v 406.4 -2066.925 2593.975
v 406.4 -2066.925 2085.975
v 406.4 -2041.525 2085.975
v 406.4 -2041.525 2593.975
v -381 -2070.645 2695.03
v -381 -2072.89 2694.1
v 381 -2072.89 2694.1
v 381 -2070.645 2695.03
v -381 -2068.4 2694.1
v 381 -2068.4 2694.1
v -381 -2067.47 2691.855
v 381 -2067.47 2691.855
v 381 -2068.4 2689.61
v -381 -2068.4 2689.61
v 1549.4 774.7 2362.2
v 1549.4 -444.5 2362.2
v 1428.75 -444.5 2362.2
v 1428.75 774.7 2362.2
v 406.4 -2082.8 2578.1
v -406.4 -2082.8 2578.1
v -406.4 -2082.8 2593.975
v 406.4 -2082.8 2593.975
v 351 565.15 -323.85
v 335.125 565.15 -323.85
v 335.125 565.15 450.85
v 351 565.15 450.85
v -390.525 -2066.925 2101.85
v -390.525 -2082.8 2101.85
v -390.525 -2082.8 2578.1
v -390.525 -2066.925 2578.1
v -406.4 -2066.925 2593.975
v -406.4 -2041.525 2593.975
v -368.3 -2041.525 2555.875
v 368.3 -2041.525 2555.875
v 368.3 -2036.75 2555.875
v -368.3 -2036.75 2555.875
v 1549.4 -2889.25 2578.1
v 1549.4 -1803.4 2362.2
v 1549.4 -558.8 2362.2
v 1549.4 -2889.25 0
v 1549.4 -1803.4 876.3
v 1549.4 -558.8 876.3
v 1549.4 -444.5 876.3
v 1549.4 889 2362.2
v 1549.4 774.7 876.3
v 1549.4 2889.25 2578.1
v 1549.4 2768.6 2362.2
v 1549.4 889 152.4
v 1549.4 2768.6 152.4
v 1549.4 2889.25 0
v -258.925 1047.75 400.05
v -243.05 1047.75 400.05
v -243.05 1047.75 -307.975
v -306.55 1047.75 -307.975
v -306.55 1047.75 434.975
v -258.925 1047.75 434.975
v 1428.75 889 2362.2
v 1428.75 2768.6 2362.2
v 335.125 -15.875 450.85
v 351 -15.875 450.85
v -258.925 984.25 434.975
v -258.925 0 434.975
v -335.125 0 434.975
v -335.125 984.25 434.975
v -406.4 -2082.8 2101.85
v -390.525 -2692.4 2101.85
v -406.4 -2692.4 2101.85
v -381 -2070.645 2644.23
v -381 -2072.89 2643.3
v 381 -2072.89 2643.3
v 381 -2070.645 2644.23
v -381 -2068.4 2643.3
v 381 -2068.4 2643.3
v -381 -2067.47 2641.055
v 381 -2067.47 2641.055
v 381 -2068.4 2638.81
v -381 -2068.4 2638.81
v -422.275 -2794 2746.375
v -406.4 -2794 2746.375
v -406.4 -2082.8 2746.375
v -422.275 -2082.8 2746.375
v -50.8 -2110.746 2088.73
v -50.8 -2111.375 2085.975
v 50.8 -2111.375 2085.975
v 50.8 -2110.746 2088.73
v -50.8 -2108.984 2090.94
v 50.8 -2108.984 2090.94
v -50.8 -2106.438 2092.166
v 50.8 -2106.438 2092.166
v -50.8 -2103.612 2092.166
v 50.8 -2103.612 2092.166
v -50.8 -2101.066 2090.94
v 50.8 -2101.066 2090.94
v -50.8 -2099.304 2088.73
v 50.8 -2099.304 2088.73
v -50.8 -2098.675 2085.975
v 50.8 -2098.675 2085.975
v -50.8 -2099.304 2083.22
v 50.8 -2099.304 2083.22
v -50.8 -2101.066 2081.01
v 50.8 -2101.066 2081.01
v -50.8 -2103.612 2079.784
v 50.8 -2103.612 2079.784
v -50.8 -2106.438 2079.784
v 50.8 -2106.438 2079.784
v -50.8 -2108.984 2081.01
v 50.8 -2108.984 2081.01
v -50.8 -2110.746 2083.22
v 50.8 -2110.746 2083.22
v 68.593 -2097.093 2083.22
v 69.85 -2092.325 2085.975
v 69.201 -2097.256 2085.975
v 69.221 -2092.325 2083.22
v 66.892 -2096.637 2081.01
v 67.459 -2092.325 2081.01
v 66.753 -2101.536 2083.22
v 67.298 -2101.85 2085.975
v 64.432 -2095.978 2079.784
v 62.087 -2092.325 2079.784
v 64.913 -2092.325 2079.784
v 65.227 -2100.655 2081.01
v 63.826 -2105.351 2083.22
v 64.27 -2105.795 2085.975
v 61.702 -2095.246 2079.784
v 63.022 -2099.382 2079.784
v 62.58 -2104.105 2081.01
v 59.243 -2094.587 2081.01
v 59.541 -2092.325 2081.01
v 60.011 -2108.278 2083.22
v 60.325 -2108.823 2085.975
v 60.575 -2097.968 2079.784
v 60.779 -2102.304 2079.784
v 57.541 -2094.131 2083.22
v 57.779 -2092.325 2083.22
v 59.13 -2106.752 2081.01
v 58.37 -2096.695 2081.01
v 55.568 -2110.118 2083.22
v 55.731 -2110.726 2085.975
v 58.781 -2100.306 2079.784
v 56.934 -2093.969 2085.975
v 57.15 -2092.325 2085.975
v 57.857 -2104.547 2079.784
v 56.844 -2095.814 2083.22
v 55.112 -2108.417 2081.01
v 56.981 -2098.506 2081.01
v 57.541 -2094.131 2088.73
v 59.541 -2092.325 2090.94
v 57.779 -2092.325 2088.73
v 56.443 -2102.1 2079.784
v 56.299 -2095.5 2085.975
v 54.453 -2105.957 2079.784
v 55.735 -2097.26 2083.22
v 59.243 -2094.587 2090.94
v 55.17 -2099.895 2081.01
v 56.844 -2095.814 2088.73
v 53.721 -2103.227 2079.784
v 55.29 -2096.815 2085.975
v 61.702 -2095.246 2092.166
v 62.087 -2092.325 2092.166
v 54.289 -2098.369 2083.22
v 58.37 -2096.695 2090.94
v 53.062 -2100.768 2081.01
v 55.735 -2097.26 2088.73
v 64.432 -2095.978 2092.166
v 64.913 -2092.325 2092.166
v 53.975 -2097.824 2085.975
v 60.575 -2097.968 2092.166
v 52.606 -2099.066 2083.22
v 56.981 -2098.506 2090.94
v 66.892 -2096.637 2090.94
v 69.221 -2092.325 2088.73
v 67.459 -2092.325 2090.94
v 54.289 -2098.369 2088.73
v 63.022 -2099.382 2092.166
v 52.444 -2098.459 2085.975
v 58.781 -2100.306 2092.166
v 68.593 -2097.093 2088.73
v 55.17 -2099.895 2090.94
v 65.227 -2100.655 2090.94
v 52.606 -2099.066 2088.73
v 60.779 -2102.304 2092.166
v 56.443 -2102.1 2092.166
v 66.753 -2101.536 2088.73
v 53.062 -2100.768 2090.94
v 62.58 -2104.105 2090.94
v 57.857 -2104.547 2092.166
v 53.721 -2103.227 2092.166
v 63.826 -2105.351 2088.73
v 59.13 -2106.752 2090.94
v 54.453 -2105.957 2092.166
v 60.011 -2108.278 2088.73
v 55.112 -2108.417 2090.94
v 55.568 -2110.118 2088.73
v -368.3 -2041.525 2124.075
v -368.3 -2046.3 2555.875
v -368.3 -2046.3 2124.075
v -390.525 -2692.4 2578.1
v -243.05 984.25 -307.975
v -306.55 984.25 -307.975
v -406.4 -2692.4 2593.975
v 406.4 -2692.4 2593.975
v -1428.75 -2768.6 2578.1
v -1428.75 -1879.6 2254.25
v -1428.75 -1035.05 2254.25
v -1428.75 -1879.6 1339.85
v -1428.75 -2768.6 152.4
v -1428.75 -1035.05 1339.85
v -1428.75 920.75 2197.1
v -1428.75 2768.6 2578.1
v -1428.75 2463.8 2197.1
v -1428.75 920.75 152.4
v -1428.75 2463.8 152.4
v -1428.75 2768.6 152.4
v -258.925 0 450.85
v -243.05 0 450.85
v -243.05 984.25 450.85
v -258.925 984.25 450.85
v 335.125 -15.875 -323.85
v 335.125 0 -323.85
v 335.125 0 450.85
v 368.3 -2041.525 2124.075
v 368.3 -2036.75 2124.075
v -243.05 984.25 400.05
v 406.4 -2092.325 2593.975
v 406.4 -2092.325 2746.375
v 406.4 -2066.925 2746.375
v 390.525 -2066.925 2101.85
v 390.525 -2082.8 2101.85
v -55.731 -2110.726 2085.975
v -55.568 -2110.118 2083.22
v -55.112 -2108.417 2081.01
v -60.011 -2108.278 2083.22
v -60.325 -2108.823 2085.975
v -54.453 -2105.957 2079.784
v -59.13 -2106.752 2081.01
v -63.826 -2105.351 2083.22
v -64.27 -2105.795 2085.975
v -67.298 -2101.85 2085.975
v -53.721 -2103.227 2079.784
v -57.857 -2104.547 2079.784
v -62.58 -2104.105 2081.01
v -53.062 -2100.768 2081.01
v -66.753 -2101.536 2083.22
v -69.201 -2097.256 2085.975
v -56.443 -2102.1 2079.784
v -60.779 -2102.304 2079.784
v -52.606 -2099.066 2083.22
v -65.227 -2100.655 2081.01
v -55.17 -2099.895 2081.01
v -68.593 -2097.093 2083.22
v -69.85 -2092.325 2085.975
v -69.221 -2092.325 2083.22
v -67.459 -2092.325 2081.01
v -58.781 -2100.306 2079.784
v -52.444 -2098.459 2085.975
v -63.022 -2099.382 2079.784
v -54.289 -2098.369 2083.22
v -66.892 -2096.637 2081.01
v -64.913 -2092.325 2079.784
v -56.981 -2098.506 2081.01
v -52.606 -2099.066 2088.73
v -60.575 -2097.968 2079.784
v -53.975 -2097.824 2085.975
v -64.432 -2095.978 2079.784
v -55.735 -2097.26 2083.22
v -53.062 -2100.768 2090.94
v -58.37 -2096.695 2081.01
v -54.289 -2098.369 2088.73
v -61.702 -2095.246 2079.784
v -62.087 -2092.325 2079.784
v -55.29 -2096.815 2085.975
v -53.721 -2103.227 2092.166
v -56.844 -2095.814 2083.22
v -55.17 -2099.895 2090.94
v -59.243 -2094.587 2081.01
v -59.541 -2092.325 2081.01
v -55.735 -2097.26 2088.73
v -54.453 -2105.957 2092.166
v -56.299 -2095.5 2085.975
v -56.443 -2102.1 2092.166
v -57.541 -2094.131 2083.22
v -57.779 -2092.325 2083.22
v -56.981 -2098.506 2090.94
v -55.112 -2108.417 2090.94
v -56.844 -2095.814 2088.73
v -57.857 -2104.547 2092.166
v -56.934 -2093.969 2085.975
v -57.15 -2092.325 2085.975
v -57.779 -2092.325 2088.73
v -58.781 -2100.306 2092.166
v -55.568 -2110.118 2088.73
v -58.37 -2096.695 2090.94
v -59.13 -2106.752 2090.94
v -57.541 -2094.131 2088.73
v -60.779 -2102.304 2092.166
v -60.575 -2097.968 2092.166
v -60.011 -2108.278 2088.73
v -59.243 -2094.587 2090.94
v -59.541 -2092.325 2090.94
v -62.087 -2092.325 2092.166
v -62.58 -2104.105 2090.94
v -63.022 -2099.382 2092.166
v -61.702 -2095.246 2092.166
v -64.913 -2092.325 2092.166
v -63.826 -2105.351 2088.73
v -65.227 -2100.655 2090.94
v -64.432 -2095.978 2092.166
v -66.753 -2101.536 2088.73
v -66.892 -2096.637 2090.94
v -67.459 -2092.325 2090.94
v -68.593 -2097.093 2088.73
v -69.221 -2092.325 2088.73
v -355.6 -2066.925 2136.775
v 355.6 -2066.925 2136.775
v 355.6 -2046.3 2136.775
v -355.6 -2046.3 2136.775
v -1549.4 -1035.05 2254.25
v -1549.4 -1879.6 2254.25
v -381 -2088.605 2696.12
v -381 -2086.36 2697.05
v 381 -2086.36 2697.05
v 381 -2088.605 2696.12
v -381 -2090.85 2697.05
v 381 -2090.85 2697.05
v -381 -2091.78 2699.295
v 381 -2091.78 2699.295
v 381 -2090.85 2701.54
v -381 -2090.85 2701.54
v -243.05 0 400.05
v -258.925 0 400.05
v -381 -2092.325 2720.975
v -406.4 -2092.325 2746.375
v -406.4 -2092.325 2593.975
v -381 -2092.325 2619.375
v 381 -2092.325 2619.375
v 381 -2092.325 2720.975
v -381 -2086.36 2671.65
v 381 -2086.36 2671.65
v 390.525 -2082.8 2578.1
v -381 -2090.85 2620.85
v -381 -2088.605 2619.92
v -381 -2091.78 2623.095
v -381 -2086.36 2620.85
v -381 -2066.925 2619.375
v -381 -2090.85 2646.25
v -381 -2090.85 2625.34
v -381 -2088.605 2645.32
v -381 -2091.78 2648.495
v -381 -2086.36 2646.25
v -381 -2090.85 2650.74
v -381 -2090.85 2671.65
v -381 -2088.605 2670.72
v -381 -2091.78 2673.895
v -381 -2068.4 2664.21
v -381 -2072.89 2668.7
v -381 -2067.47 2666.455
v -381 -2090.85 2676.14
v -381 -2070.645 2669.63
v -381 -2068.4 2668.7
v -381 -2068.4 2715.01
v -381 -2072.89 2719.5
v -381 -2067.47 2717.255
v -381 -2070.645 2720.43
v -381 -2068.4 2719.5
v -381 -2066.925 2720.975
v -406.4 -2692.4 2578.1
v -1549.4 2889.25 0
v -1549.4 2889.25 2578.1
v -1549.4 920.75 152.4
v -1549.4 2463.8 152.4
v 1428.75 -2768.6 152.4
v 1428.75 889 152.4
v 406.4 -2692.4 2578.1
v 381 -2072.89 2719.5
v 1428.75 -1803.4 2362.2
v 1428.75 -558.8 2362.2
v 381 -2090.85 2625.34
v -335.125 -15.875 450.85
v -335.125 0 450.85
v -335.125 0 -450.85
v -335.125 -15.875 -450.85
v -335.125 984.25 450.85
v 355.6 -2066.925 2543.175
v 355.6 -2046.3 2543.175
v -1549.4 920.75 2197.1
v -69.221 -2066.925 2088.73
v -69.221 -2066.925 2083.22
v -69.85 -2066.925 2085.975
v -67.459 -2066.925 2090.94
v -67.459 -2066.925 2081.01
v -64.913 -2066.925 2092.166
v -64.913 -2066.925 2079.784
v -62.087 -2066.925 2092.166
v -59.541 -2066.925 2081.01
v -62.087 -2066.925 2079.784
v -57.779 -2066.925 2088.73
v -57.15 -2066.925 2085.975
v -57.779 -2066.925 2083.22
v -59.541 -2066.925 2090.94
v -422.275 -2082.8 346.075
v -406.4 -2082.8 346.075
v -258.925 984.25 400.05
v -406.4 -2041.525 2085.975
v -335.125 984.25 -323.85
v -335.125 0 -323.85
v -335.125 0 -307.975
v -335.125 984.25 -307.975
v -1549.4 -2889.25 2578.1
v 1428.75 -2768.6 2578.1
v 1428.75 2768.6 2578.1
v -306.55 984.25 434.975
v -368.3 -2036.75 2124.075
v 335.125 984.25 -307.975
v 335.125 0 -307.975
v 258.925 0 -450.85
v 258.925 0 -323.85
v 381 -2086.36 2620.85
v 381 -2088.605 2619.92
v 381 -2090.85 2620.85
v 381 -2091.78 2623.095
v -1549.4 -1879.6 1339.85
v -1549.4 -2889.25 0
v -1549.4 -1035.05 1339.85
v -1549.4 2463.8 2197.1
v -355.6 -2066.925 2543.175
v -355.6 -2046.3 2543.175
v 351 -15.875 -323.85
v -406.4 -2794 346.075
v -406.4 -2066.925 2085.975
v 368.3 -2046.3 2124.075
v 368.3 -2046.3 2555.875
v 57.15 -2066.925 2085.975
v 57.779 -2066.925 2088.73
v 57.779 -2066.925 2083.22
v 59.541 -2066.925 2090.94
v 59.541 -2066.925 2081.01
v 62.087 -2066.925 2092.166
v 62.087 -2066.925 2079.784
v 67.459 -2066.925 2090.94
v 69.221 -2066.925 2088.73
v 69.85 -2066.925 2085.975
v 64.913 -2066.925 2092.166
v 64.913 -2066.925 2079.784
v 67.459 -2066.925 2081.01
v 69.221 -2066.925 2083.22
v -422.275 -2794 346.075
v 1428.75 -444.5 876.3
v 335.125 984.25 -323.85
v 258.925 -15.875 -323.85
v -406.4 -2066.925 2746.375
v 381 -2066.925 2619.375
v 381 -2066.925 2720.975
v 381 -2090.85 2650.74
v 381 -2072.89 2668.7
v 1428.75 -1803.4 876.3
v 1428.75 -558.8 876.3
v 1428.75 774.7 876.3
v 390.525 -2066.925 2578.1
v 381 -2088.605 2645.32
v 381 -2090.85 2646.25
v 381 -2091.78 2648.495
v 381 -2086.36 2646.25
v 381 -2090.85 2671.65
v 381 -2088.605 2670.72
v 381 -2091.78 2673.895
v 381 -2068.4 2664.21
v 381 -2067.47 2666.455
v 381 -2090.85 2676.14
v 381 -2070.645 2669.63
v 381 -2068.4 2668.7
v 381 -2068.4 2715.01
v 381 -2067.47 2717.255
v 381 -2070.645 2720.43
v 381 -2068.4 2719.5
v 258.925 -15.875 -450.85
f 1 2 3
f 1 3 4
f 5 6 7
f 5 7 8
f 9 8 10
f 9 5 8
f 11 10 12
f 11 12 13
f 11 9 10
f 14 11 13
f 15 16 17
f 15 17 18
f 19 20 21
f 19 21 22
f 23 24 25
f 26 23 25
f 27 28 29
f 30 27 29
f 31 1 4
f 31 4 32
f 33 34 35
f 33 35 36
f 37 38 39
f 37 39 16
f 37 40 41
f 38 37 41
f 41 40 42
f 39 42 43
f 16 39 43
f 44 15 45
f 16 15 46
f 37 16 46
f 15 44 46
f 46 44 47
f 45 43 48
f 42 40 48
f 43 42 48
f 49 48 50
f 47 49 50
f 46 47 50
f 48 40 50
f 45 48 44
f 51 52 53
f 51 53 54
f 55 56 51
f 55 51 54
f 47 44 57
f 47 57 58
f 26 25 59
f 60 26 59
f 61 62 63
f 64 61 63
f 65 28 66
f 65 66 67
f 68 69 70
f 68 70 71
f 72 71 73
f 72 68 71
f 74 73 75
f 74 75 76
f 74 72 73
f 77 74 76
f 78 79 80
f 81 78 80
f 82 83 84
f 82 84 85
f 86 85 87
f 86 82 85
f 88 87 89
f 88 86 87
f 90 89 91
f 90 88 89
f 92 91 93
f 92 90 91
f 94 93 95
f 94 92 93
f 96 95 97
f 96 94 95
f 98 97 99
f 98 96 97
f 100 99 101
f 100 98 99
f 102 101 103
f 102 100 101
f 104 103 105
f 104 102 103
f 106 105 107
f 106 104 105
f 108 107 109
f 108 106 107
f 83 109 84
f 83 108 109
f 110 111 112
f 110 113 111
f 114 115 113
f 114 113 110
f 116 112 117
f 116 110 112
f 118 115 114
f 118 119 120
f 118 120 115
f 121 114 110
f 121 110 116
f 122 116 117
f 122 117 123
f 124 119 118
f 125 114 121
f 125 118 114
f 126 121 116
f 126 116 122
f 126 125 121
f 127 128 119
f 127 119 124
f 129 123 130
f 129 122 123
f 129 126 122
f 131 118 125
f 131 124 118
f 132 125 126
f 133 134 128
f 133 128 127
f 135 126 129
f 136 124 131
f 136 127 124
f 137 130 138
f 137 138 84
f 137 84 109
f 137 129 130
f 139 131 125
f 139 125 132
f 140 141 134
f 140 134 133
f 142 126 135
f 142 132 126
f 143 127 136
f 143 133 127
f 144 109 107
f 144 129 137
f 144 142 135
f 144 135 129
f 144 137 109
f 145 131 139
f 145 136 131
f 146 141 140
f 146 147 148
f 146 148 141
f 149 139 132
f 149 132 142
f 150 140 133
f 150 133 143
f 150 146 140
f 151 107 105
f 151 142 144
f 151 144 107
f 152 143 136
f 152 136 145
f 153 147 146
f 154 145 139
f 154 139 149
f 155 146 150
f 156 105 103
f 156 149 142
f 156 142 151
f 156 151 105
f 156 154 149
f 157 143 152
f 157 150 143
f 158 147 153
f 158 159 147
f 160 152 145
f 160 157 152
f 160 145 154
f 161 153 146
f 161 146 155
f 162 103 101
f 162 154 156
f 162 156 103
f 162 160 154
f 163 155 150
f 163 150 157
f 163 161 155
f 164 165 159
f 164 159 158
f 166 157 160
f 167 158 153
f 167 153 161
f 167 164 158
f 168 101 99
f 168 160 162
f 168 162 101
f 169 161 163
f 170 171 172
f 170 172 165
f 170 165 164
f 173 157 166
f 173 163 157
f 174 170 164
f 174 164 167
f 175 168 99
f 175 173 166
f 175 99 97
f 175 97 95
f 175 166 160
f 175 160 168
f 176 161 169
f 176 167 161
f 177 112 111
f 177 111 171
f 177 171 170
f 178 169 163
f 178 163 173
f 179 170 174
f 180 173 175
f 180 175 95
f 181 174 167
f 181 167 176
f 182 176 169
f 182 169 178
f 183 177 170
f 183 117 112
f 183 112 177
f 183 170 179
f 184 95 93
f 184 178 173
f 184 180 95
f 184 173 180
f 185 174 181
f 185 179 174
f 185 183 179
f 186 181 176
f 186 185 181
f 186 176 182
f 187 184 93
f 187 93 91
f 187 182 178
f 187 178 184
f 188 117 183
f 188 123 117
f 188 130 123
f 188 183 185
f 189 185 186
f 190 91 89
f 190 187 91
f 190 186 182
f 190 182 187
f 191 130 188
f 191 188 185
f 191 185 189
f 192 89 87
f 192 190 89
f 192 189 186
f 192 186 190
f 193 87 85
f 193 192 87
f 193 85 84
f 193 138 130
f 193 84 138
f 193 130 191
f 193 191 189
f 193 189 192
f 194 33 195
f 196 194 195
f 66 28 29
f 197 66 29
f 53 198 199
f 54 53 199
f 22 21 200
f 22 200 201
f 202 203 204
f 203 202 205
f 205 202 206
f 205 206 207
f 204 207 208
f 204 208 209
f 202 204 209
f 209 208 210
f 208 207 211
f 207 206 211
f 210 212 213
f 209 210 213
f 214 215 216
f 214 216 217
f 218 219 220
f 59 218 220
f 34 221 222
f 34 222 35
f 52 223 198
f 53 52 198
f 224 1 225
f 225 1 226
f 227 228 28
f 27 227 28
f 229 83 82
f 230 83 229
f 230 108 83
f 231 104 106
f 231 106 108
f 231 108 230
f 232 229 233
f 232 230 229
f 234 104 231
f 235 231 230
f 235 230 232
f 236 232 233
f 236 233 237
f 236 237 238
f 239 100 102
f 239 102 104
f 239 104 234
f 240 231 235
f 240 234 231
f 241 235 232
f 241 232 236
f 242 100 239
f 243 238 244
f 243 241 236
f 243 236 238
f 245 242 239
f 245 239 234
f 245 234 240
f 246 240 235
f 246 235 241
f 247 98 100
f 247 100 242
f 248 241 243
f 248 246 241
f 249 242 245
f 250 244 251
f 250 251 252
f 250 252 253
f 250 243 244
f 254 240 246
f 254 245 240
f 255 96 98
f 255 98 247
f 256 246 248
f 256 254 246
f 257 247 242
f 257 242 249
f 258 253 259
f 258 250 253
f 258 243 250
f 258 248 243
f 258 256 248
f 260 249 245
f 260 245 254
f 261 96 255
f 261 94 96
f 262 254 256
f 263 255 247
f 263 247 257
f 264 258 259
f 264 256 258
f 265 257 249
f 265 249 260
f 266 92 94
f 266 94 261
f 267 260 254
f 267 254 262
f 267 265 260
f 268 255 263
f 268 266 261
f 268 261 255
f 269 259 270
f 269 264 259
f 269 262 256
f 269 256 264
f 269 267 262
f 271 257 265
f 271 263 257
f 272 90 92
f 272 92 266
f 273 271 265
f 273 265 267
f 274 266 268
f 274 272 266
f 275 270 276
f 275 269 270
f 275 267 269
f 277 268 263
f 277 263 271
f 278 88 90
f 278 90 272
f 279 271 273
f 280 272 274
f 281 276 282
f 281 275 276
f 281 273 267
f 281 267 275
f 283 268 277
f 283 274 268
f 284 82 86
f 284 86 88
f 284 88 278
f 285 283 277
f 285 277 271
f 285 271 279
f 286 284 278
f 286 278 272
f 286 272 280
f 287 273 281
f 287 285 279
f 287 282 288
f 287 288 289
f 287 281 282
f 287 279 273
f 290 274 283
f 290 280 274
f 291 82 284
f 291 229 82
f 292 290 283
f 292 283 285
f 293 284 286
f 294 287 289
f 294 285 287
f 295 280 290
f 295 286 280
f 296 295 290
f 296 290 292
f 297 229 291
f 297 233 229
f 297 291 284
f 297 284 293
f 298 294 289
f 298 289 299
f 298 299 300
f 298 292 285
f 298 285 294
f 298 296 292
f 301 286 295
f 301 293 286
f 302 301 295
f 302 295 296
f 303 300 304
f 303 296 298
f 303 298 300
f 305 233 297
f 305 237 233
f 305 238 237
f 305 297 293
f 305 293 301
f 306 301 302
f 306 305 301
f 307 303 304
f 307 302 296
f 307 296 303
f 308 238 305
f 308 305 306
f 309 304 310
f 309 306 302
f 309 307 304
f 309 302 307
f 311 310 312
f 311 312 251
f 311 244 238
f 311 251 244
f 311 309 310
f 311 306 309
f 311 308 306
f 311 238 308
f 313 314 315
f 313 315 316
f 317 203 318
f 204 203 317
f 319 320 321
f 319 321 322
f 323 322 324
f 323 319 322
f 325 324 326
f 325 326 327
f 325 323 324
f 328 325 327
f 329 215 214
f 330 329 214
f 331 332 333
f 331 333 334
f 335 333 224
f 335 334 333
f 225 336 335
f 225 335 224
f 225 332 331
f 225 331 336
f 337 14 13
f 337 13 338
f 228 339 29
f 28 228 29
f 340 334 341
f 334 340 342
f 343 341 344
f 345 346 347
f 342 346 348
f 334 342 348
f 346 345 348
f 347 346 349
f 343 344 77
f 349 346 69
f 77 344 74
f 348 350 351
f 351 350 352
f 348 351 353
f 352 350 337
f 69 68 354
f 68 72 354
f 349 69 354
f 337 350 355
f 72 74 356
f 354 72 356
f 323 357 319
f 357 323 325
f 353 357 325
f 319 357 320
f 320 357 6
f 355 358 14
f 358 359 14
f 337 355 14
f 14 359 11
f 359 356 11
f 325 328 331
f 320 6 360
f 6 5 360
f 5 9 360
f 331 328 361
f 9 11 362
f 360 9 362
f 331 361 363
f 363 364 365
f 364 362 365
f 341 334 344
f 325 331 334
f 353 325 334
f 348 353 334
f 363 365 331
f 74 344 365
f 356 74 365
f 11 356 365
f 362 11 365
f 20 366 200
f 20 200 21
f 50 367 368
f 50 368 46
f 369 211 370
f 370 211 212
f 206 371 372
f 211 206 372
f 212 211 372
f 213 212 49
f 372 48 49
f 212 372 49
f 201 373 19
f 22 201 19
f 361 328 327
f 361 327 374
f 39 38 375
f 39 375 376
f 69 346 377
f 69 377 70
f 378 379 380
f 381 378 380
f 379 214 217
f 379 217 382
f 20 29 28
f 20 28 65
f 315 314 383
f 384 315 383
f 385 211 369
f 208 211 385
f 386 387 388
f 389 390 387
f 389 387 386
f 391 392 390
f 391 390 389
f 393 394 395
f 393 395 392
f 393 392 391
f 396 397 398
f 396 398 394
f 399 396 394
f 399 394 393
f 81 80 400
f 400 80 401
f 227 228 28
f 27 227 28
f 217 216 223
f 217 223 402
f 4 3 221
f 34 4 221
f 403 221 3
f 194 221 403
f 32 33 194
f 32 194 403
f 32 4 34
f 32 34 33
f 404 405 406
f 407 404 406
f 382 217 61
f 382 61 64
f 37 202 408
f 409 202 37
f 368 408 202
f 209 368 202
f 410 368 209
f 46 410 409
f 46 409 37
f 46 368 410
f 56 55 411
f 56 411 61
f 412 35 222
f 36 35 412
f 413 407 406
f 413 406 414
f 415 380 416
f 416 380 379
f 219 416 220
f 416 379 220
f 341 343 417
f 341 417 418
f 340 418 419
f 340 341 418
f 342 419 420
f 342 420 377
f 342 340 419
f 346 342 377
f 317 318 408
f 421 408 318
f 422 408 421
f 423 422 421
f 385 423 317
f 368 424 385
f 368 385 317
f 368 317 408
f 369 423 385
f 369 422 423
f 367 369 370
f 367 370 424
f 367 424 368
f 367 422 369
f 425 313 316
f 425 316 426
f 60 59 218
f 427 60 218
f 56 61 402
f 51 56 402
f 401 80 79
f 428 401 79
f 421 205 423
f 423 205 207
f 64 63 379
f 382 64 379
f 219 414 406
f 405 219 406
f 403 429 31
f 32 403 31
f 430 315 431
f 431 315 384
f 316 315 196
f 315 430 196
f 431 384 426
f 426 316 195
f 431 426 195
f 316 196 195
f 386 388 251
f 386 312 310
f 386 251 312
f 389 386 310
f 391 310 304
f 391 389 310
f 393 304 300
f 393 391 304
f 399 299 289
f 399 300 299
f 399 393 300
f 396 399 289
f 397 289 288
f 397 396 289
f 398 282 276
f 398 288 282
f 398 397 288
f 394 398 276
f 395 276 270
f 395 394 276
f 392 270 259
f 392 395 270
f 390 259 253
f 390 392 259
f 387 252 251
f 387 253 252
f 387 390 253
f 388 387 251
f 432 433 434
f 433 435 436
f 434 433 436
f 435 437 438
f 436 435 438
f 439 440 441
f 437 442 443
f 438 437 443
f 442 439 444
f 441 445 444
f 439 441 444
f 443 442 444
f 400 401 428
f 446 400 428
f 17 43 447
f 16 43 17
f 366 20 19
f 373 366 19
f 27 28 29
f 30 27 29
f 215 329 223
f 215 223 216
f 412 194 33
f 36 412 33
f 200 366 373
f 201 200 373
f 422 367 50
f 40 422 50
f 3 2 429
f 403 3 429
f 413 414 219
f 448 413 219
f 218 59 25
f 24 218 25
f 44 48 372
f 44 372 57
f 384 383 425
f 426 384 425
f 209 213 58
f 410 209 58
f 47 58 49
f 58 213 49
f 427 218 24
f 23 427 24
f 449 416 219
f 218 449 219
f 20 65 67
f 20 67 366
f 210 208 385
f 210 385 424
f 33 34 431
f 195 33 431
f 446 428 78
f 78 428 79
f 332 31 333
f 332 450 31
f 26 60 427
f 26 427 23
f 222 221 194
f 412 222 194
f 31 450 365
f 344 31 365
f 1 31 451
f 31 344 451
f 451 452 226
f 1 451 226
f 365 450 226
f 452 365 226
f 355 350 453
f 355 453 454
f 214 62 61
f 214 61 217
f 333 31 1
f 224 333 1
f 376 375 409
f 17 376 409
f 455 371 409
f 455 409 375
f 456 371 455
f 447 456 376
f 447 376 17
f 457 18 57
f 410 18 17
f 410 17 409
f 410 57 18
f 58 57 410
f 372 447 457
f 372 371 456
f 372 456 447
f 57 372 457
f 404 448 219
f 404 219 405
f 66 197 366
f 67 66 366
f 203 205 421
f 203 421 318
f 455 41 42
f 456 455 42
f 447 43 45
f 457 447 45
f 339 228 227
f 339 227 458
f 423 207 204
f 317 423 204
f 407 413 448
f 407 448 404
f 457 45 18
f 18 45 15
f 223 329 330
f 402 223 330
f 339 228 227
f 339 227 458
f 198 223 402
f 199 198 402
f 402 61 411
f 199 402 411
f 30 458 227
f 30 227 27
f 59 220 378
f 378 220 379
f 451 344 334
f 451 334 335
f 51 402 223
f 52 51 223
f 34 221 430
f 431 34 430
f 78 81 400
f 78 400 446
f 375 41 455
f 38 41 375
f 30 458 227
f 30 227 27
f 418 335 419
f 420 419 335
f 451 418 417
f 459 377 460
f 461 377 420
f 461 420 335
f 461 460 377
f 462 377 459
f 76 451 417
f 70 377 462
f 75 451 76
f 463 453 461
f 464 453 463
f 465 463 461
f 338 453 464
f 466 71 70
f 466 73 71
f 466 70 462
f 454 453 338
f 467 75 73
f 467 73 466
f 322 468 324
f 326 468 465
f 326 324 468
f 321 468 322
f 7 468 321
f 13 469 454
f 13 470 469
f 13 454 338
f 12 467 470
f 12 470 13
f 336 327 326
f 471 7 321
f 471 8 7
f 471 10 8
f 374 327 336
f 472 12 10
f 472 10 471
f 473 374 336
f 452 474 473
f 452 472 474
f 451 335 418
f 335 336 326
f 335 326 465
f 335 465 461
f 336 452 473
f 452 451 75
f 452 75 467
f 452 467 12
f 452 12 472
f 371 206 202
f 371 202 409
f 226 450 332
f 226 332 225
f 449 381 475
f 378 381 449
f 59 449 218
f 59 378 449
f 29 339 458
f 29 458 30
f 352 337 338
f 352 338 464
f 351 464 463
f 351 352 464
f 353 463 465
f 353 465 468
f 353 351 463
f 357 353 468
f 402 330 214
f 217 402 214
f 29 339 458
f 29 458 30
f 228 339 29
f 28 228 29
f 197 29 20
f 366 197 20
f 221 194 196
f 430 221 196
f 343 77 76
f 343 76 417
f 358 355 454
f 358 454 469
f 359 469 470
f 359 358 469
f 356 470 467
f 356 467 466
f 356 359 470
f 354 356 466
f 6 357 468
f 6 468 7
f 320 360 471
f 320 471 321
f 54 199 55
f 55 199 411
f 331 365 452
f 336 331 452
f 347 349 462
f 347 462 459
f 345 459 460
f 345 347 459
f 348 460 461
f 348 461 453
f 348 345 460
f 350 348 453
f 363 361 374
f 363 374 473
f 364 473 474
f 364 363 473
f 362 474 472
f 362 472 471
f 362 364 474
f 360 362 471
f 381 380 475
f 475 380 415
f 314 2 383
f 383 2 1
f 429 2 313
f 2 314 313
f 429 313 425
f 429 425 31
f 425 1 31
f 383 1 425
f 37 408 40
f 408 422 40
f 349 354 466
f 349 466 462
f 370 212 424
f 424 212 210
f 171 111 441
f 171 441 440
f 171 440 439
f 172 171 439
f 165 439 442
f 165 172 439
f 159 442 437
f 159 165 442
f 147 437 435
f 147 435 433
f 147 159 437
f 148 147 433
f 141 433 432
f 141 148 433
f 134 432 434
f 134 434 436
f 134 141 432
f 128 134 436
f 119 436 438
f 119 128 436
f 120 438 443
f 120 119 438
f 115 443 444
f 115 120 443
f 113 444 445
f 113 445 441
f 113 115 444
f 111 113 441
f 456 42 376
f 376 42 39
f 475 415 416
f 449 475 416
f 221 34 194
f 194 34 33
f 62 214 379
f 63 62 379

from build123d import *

# Parameters (mm, degrees)
F0_W      = 3098.8
F0_H      = 5778.5
F1_DEPTH  = 152.4
F2_W      = 3098.8
F2_H      = 5778.5
F2_W_2    = 2857.5
F2_H_2    = 5537.2
F3_DEPTH  = 2425.7
F4_W      = 1879.6
F4_H      = 2209.8
F5_DEPTH  = 120.65
F6_W      = 1219.2
F6_H      = 1485.9
F6_W_2    = 1244.6
F7_DEPTH  = 120.65
F8_W      = 844.55
F8_H      = 914.4
F9_DEPTH  = 120.651
F10_W     = 1543.05
F10_H     = 2044.7
F11_DEPTH = 120.651
F13_W     = 812.8
F13_H     = 609.6
F14_DEPTH = 15.875
F15_W     = 781.05
F15_H     = 476.25
F16_DEPTH = 15.875
F15_W_2   = 15.875
F17_DEPTH = 609.6
F18_DEPTH = 15.875
F19_W     = 812.8
F19_H     = 508
F19_W_2   = 781.05
F19_H_2   = 476.25
F19_W_3   = 711.2
F19_H_3   = 406.4
F20_DEPTH = 25.4
F21_W     = 4.7752
F21_H     = 12.7
F24_W     = 736.6
F24_H     = 431.8
F25_DEPTH = 4.7752
F29_W     = 812.8
F29_H     = 152.4
F29_W_2   = 762
F29_H_2   = 101.6
F30_DEPTH = 25.4
F32_DEPTH = 787.4
F34_DEPTH = 15.875
F35_W     = 76.2
F35_H     = 15.875
F36_DEPTH = 984.25
F38_DEPTH = 984.25
F39_W     = 15.875
F39_H     = 50.8
F40_DEPTH = 984.25
F42_DEPTH = 63.5
F43_W     = 565.15
F43_H     = 15.875
F44_DEPTH = 15.875
F45_W     = 609.6
F45_H     = 476.25
F46_DEPTH = 15.875


with BuildPart() as f1:
    # F0 (on Top) → F1 (new body)
    with BuildSketch(Plane.XY):
        Rectangle(F0_W, F0_H)
    extrude(amount=F1_DEPTH)

    # F2 (on face) → F3 (join)
    with BuildSketch(Plane.XY.offset(152.4)):
        Rectangle(F2_W, F2_H)
        Rectangle(F2_W_2, F2_H_2, mode=Mode.SUBTRACT)
    extrude(amount=F3_DEPTH)

    # F4 (on face) → F5 (cut, through all)
    with BuildSketch(Plane.YZ.offset(1549.4)):
        with Locations((1828.8, 1257.3)):
            Rectangle(F4_W, F4_H)
    extrude(amount=-F5_DEPTH, mode=Mode.SUBTRACT)

    # F6 (on face) → F7 (cut, through all)
    with BuildSketch(Plane.YZ.offset(1549.4)):
        with Locations((165.1, 1619.25)):
            Rectangle(F6_W, F6_H)
        with Locations((-1181.1, 1619.25)):
            Rectangle(F6_W_2, F6_H)
    extrude(amount=-F7_DEPTH, mode=Mode.SUBTRACT)

    # F8 (on face) → F9 (cut, through all)
    with BuildSketch(Plane.YZ.offset(-1428.75)):
        with Locations((-1457.325, 1797.05)):
            Rectangle(F8_W, F8_H)
    extrude(amount=-F9_DEPTH, mode=Mode.SUBTRACT)

    # F10 (on face) → F11 (cut, through all)
    with BuildSketch(Plane.YZ.offset(-1428.75)):
        with Locations((1692.275, 1174.75)):
            Rectangle(F10_W, F10_H)
    extrude(amount=-F11_DEPTH, mode=Mode.SUBTRACT)


with BuildPart() as f14:
    # F13 (on face) → F14 (new body)
    with BuildSketch(Plane.XY.offset(2578.1)):
        with Locations((0, -2387.6)):
            Rectangle(F13_W, F13_H)
    extrude(amount=F14_DEPTH)


with BuildPart() as f16:
    # F15 (on face) → F16 (new body)
    with BuildSketch(Plane(origin=(0, -2082.8, 0), x_dir=(-1, 0, 0), z_dir=(0, 1, 0))):
        with Locations((0, 2339.975)):
            Rectangle(F15_W, F15_H)
    extrude(amount=F16_DEPTH)


with BuildPart() as f17:
    # F15 (on face) → F17 (new body, through all)
    with BuildSketch(Plane(origin=(0, -2082.8, 0), x_dir=(-1, 0, 0), z_dir=(0, 1, 0))):
        with Locations((398.4625, 2339.975)):
            Rectangle(F15_W_2, F15_H)
    extrude(amount=-F17_DEPTH)


with BuildPart() as f18:
    # F15 (on face) → F18 (new body)
    with BuildSketch(Plane(origin=(0, -2082.8, 0), x_dir=(-1, 0, 0), z_dir=(0, 1, 0))):
        with Locations((0, 2339.975)):
            Rectangle(F15_W, F15_H)
    extrude(amount=F18_DEPTH)


with BuildPart() as f20:
    # F19 (on face) → F20 (new body)
    with BuildSketch(Plane(origin=(0, -2066.925, 0), x_dir=(-1, 0, 0), z_dir=(0, 1, 0))):
        with Locations((0, 2339.975)):
            Rectangle(F19_W, F19_H)
        with Locations((0, 2339.975)):
            Rectangle(F19_W_2, F19_H_2, mode=Mode.SUBTRACT)
        with Locations((0, 2339.975)):
            Rectangle(F19_W_2, F19_H_2)
        with Locations((0, 2339.975)):
            Rectangle(F19_W_3, F19_H_3, mode=Mode.SUBTRACT)
    extrude(amount=F20_DEPTH)

    # F23: sweep along a path in F22
    with BuildLine(Plane(origin=(0, -2041.525, 0), x_dir=(-1, 0, 0), z_dir=(0, 1, 0))) as f23_path:
        Line((355.6, 2543.175), (-355.6, 2543.175))
        Line((-355.6, 2543.175), (-355.6, 2136.775))
        Line((-355.6, 2136.775), (355.6, 2136.775))
        Line((355.6, 2136.775), (355.6, 2543.175))
    # F21 (on face) → F23 (sweep, cut)
    with BuildSketch(Plane(origin=(355.6, 0, 0), x_dir=(0, -1, 0), z_dir=(-1, 0, 0))):
        with Locations((2043.9126, 2130.425)):
            Rectangle(F21_W, F21_H)
    sweep(path=f23_path.line, transition=Transition.RIGHT, mode=Mode.SUBTRACT)


with BuildPart() as f25:
    # F24 (on face) → F25 (new body)
    with BuildSketch(Plane(origin=(0, -2041.525, 0), x_dir=(-1, 0, 0), z_dir=(0, 1, 0))):
        with Locations((0, 2339.975)):
            Rectangle(F24_W, F24_H)
    extrude(amount=F25_DEPTH)


with BuildPart() as f28:
    # F28: sweep along a path in F26
    with BuildLine(Plane(origin=(0, 0, 2085.975), x_dir=(1, 0, 0), z_dir=(0, 0, -1))) as f28_path:
        Line((63.5, 2066.925), (63.5, 2092.325))
        ThreePointArc((63.5, 2092.325), (59.7802561211, 2101.3052561211), (50.8, 2105.025))
        Line((50.8, 2105.025), (-50.8, 2105.025))
        ThreePointArc((-50.8, 2105.025), (-59.7802561211, 2101.3052561211), (-63.5, 2092.325))
        Line((-63.5, 2092.325), (-63.5, 2066.925))
    # F27 (on face) → F28 (sweep)
    with BuildSketch(Plane.XZ.offset(2066.925)):
        with BuildLine():
            ThreePointArc((57.15, 2085.975), (63.5, 2079.625), (69.85, 2085.975))
            Line((69.85, 2085.975), (57.15, 2085.975))
        make_face()
        with BuildLine():
            Line((57.15, 2085.975), (69.85, 2085.975))
            ThreePointArc((69.85, 2085.975), (63.5, 2092.325), (57.15, 2085.975))
        make_face()
    sweep(path=f28_path.line)


with BuildPart() as f30:
    # F29 (on face) → F30 (new body)
    with BuildSketch(Plane.XZ.offset(2066.925)):
        with Locations((0, 2670.175)):
            Rectangle(F29_W, F29_H)
        with Locations((0, 2670.175)):
            Rectangle(F29_W_2, F29_H_2, mode=Mode.SUBTRACT)
    extrude(amount=F30_DEPTH)

    # F31 (on face) → F32 (join, through all)
    with BuildSketch(Plane(origin=(-406.4, 0, 0), x_dir=(0, -1, 0), z_dir=(-1, 0, 0))):
        with BuildLine():
            Line((2068.3996798487, 2715.0101920908), (2086.3601920908, 2697.0496798487))
            ThreePointArc((2086.3601920908, 2697.0496798487), (2090.8503201513, 2697.0496798487), (2090.8503201513, 2701.5398079092))
            Line((2090.8503201513, 2701.5398079092), (2072.8898079092, 2719.5003201513))
            ThreePointArc((2072.8898079092, 2719.5003201513), (2068.3996798487, 2719.5003201513), (2068.3996798487, 2715.0101920908))
        make_face()
        with BuildLine():
            Line((2068.3996798487, 2689.6101920908), (2086.3601920908, 2671.6496798487))
            ThreePointArc((2086.3601920908, 2671.6496798487), (2090.8503201513, 2671.6496798487), (2090.8503201513, 2676.1398079092))
            Line((2090.8503201513, 2676.1398079092), (2072.8898079092, 2694.1003201513))
            ThreePointArc((2072.8898079092, 2694.1003201513), (2068.3996798487, 2694.1003201513), (2068.3996798487, 2689.6101920908))
        make_face()
        with BuildLine():
            Line((2068.3996798487, 2664.2101920908), (2086.3601920908, 2646.2496798487))
            ThreePointArc((2086.3601920908, 2646.2496798487), (2090.8503201513, 2646.2496798487), (2090.8503201513, 2650.7398079092))
            Line((2090.8503201513, 2650.7398079092), (2072.8898079092, 2668.7003201513))
            ThreePointArc((2072.8898079092, 2668.7003201513), (2068.3996798487, 2668.7003201513), (2068.3996798487, 2664.2101920908))
        make_face()
        with BuildLine():
            Line((2090.8503201513, 2625.3398079092), (2072.8898079092, 2643.3003201513))
            ThreePointArc((2072.8898079092, 2643.3003201513), (2068.3996798487, 2643.3003201513), (2068.3996798487, 2638.8101920908))
            Line((2068.3996798487, 2638.8101920908), (2086.3601920908, 2620.8496798487))
            ThreePointArc((2086.3601920908, 2620.8496798487), (2090.8503201513, 2620.8496798487), (2090.8503201513, 2625.3398079092))
        make_face()
    extrude(amount=-F32_DEPTH)


with BuildPart() as f34:
    # F33 (on Front) → F34 (new body)
    with BuildSketch(Plane.XZ):
        Polygon((335.1245088988, 450.85), (-335.1245088988, 450.85), (-335.1245088988, -450.85), (258.9245088988, -450.85), (258.9245088988, -323.85), (335.1245088988, -323.85), align=None)
    extrude(amount=F34_DEPTH)


with BuildPart() as f36:
    # F35 (on face) → F36 (new body)
    with BuildSketch(Plane(origin=(0, 0, 0), x_dir=(-1, 0, 0), z_dir=(0, 1, 0))):
        with Locations((297.0245088988, 442.9125)):
            Rectangle(F35_W, F35_H)
    extrude(amount=F36_DEPTH)


with BuildPart() as f38:
    # F37 (on face) → F38 (new body)
    with BuildSketch(Plane(origin=(0, 0, 0), x_dir=(-1, 0, 0), z_dir=(0, 1, 0))):
        Polygon((335.1245088988, -307.975), (-335.1245088988, -307.975), (-335.1245088988, -323.85), (-258.9245088988, -323.85), (335.1245088988, -323.85), align=None)
    extrude(amount=F38_DEPTH)


with BuildPart() as f40:
    # F39 (on face) → F40 (new body)
    with BuildSketch(Plane(origin=(0, 0, 0), x_dir=(-1, 0, 0), z_dir=(0, 1, 0))):
        with Locations((250.9870088988, 425.45)):
            Rectangle(F39_W, F39_H)
    extrude(amount=F40_DEPTH)


with BuildPart() as f42:
    # F41 (on face) → F42 (new body)
    with BuildSketch(Plane(origin=(0, 984.25, 0), x_dir=(-1, 0, 0), z_dir=(0, 1, 0))):
        Polygon((243.0495088988, 400.05), (243.0495088988, -307.975), (306.5495088988, -307.975), (306.5495088988, 434.975), (258.9245088988, 434.975), (258.9245088988, 400.05), align=None)
    extrude(amount=F42_DEPTH)


with BuildPart() as f44:
    # F43 (on face) → F44 (new body)
    with BuildSketch(Plane.YZ.offset(335.1245088988)):
        Polygon((565.15, 450.85), (-15.875, 450.85), (-15.875, -323.85), (0, -323.85), (0, -307.975), (565.15, -307.975), align=None)
        with Locations((282.575, -315.9125)):
            Rectangle(F43_W, F43_H)
    extrude(amount=F44_DEPTH)


with BuildPart() as f46:
    # F45 (on face) → F46 (new body)
    with BuildSketch(Plane(origin=(-406.4, 0, 0), x_dir=(0, -1, 0), z_dir=(-1, 0, 0))):
        Polygon((2794, 2746.375), (2082.8, 2746.375), (2082.8, 2578.1), (2692.4, 2578.1), (2692.4, 2101.85), (2082.8, 2101.85), (2082.8, 346.075), (2794, 346.075), align=None)
        with Locations((2387.6, 2339.975)):
            Rectangle(F45_W, F45_H)
    extrude(amount=F46_DEPTH)


solid = Compound([f1.part, f14.part, f16.part, f17.part, f18.part, f20.part, f25.part, f28.part, f30.part, f34.part, f36.part, f38.part, f40.part, f42.part, f44.part, f46.part])
